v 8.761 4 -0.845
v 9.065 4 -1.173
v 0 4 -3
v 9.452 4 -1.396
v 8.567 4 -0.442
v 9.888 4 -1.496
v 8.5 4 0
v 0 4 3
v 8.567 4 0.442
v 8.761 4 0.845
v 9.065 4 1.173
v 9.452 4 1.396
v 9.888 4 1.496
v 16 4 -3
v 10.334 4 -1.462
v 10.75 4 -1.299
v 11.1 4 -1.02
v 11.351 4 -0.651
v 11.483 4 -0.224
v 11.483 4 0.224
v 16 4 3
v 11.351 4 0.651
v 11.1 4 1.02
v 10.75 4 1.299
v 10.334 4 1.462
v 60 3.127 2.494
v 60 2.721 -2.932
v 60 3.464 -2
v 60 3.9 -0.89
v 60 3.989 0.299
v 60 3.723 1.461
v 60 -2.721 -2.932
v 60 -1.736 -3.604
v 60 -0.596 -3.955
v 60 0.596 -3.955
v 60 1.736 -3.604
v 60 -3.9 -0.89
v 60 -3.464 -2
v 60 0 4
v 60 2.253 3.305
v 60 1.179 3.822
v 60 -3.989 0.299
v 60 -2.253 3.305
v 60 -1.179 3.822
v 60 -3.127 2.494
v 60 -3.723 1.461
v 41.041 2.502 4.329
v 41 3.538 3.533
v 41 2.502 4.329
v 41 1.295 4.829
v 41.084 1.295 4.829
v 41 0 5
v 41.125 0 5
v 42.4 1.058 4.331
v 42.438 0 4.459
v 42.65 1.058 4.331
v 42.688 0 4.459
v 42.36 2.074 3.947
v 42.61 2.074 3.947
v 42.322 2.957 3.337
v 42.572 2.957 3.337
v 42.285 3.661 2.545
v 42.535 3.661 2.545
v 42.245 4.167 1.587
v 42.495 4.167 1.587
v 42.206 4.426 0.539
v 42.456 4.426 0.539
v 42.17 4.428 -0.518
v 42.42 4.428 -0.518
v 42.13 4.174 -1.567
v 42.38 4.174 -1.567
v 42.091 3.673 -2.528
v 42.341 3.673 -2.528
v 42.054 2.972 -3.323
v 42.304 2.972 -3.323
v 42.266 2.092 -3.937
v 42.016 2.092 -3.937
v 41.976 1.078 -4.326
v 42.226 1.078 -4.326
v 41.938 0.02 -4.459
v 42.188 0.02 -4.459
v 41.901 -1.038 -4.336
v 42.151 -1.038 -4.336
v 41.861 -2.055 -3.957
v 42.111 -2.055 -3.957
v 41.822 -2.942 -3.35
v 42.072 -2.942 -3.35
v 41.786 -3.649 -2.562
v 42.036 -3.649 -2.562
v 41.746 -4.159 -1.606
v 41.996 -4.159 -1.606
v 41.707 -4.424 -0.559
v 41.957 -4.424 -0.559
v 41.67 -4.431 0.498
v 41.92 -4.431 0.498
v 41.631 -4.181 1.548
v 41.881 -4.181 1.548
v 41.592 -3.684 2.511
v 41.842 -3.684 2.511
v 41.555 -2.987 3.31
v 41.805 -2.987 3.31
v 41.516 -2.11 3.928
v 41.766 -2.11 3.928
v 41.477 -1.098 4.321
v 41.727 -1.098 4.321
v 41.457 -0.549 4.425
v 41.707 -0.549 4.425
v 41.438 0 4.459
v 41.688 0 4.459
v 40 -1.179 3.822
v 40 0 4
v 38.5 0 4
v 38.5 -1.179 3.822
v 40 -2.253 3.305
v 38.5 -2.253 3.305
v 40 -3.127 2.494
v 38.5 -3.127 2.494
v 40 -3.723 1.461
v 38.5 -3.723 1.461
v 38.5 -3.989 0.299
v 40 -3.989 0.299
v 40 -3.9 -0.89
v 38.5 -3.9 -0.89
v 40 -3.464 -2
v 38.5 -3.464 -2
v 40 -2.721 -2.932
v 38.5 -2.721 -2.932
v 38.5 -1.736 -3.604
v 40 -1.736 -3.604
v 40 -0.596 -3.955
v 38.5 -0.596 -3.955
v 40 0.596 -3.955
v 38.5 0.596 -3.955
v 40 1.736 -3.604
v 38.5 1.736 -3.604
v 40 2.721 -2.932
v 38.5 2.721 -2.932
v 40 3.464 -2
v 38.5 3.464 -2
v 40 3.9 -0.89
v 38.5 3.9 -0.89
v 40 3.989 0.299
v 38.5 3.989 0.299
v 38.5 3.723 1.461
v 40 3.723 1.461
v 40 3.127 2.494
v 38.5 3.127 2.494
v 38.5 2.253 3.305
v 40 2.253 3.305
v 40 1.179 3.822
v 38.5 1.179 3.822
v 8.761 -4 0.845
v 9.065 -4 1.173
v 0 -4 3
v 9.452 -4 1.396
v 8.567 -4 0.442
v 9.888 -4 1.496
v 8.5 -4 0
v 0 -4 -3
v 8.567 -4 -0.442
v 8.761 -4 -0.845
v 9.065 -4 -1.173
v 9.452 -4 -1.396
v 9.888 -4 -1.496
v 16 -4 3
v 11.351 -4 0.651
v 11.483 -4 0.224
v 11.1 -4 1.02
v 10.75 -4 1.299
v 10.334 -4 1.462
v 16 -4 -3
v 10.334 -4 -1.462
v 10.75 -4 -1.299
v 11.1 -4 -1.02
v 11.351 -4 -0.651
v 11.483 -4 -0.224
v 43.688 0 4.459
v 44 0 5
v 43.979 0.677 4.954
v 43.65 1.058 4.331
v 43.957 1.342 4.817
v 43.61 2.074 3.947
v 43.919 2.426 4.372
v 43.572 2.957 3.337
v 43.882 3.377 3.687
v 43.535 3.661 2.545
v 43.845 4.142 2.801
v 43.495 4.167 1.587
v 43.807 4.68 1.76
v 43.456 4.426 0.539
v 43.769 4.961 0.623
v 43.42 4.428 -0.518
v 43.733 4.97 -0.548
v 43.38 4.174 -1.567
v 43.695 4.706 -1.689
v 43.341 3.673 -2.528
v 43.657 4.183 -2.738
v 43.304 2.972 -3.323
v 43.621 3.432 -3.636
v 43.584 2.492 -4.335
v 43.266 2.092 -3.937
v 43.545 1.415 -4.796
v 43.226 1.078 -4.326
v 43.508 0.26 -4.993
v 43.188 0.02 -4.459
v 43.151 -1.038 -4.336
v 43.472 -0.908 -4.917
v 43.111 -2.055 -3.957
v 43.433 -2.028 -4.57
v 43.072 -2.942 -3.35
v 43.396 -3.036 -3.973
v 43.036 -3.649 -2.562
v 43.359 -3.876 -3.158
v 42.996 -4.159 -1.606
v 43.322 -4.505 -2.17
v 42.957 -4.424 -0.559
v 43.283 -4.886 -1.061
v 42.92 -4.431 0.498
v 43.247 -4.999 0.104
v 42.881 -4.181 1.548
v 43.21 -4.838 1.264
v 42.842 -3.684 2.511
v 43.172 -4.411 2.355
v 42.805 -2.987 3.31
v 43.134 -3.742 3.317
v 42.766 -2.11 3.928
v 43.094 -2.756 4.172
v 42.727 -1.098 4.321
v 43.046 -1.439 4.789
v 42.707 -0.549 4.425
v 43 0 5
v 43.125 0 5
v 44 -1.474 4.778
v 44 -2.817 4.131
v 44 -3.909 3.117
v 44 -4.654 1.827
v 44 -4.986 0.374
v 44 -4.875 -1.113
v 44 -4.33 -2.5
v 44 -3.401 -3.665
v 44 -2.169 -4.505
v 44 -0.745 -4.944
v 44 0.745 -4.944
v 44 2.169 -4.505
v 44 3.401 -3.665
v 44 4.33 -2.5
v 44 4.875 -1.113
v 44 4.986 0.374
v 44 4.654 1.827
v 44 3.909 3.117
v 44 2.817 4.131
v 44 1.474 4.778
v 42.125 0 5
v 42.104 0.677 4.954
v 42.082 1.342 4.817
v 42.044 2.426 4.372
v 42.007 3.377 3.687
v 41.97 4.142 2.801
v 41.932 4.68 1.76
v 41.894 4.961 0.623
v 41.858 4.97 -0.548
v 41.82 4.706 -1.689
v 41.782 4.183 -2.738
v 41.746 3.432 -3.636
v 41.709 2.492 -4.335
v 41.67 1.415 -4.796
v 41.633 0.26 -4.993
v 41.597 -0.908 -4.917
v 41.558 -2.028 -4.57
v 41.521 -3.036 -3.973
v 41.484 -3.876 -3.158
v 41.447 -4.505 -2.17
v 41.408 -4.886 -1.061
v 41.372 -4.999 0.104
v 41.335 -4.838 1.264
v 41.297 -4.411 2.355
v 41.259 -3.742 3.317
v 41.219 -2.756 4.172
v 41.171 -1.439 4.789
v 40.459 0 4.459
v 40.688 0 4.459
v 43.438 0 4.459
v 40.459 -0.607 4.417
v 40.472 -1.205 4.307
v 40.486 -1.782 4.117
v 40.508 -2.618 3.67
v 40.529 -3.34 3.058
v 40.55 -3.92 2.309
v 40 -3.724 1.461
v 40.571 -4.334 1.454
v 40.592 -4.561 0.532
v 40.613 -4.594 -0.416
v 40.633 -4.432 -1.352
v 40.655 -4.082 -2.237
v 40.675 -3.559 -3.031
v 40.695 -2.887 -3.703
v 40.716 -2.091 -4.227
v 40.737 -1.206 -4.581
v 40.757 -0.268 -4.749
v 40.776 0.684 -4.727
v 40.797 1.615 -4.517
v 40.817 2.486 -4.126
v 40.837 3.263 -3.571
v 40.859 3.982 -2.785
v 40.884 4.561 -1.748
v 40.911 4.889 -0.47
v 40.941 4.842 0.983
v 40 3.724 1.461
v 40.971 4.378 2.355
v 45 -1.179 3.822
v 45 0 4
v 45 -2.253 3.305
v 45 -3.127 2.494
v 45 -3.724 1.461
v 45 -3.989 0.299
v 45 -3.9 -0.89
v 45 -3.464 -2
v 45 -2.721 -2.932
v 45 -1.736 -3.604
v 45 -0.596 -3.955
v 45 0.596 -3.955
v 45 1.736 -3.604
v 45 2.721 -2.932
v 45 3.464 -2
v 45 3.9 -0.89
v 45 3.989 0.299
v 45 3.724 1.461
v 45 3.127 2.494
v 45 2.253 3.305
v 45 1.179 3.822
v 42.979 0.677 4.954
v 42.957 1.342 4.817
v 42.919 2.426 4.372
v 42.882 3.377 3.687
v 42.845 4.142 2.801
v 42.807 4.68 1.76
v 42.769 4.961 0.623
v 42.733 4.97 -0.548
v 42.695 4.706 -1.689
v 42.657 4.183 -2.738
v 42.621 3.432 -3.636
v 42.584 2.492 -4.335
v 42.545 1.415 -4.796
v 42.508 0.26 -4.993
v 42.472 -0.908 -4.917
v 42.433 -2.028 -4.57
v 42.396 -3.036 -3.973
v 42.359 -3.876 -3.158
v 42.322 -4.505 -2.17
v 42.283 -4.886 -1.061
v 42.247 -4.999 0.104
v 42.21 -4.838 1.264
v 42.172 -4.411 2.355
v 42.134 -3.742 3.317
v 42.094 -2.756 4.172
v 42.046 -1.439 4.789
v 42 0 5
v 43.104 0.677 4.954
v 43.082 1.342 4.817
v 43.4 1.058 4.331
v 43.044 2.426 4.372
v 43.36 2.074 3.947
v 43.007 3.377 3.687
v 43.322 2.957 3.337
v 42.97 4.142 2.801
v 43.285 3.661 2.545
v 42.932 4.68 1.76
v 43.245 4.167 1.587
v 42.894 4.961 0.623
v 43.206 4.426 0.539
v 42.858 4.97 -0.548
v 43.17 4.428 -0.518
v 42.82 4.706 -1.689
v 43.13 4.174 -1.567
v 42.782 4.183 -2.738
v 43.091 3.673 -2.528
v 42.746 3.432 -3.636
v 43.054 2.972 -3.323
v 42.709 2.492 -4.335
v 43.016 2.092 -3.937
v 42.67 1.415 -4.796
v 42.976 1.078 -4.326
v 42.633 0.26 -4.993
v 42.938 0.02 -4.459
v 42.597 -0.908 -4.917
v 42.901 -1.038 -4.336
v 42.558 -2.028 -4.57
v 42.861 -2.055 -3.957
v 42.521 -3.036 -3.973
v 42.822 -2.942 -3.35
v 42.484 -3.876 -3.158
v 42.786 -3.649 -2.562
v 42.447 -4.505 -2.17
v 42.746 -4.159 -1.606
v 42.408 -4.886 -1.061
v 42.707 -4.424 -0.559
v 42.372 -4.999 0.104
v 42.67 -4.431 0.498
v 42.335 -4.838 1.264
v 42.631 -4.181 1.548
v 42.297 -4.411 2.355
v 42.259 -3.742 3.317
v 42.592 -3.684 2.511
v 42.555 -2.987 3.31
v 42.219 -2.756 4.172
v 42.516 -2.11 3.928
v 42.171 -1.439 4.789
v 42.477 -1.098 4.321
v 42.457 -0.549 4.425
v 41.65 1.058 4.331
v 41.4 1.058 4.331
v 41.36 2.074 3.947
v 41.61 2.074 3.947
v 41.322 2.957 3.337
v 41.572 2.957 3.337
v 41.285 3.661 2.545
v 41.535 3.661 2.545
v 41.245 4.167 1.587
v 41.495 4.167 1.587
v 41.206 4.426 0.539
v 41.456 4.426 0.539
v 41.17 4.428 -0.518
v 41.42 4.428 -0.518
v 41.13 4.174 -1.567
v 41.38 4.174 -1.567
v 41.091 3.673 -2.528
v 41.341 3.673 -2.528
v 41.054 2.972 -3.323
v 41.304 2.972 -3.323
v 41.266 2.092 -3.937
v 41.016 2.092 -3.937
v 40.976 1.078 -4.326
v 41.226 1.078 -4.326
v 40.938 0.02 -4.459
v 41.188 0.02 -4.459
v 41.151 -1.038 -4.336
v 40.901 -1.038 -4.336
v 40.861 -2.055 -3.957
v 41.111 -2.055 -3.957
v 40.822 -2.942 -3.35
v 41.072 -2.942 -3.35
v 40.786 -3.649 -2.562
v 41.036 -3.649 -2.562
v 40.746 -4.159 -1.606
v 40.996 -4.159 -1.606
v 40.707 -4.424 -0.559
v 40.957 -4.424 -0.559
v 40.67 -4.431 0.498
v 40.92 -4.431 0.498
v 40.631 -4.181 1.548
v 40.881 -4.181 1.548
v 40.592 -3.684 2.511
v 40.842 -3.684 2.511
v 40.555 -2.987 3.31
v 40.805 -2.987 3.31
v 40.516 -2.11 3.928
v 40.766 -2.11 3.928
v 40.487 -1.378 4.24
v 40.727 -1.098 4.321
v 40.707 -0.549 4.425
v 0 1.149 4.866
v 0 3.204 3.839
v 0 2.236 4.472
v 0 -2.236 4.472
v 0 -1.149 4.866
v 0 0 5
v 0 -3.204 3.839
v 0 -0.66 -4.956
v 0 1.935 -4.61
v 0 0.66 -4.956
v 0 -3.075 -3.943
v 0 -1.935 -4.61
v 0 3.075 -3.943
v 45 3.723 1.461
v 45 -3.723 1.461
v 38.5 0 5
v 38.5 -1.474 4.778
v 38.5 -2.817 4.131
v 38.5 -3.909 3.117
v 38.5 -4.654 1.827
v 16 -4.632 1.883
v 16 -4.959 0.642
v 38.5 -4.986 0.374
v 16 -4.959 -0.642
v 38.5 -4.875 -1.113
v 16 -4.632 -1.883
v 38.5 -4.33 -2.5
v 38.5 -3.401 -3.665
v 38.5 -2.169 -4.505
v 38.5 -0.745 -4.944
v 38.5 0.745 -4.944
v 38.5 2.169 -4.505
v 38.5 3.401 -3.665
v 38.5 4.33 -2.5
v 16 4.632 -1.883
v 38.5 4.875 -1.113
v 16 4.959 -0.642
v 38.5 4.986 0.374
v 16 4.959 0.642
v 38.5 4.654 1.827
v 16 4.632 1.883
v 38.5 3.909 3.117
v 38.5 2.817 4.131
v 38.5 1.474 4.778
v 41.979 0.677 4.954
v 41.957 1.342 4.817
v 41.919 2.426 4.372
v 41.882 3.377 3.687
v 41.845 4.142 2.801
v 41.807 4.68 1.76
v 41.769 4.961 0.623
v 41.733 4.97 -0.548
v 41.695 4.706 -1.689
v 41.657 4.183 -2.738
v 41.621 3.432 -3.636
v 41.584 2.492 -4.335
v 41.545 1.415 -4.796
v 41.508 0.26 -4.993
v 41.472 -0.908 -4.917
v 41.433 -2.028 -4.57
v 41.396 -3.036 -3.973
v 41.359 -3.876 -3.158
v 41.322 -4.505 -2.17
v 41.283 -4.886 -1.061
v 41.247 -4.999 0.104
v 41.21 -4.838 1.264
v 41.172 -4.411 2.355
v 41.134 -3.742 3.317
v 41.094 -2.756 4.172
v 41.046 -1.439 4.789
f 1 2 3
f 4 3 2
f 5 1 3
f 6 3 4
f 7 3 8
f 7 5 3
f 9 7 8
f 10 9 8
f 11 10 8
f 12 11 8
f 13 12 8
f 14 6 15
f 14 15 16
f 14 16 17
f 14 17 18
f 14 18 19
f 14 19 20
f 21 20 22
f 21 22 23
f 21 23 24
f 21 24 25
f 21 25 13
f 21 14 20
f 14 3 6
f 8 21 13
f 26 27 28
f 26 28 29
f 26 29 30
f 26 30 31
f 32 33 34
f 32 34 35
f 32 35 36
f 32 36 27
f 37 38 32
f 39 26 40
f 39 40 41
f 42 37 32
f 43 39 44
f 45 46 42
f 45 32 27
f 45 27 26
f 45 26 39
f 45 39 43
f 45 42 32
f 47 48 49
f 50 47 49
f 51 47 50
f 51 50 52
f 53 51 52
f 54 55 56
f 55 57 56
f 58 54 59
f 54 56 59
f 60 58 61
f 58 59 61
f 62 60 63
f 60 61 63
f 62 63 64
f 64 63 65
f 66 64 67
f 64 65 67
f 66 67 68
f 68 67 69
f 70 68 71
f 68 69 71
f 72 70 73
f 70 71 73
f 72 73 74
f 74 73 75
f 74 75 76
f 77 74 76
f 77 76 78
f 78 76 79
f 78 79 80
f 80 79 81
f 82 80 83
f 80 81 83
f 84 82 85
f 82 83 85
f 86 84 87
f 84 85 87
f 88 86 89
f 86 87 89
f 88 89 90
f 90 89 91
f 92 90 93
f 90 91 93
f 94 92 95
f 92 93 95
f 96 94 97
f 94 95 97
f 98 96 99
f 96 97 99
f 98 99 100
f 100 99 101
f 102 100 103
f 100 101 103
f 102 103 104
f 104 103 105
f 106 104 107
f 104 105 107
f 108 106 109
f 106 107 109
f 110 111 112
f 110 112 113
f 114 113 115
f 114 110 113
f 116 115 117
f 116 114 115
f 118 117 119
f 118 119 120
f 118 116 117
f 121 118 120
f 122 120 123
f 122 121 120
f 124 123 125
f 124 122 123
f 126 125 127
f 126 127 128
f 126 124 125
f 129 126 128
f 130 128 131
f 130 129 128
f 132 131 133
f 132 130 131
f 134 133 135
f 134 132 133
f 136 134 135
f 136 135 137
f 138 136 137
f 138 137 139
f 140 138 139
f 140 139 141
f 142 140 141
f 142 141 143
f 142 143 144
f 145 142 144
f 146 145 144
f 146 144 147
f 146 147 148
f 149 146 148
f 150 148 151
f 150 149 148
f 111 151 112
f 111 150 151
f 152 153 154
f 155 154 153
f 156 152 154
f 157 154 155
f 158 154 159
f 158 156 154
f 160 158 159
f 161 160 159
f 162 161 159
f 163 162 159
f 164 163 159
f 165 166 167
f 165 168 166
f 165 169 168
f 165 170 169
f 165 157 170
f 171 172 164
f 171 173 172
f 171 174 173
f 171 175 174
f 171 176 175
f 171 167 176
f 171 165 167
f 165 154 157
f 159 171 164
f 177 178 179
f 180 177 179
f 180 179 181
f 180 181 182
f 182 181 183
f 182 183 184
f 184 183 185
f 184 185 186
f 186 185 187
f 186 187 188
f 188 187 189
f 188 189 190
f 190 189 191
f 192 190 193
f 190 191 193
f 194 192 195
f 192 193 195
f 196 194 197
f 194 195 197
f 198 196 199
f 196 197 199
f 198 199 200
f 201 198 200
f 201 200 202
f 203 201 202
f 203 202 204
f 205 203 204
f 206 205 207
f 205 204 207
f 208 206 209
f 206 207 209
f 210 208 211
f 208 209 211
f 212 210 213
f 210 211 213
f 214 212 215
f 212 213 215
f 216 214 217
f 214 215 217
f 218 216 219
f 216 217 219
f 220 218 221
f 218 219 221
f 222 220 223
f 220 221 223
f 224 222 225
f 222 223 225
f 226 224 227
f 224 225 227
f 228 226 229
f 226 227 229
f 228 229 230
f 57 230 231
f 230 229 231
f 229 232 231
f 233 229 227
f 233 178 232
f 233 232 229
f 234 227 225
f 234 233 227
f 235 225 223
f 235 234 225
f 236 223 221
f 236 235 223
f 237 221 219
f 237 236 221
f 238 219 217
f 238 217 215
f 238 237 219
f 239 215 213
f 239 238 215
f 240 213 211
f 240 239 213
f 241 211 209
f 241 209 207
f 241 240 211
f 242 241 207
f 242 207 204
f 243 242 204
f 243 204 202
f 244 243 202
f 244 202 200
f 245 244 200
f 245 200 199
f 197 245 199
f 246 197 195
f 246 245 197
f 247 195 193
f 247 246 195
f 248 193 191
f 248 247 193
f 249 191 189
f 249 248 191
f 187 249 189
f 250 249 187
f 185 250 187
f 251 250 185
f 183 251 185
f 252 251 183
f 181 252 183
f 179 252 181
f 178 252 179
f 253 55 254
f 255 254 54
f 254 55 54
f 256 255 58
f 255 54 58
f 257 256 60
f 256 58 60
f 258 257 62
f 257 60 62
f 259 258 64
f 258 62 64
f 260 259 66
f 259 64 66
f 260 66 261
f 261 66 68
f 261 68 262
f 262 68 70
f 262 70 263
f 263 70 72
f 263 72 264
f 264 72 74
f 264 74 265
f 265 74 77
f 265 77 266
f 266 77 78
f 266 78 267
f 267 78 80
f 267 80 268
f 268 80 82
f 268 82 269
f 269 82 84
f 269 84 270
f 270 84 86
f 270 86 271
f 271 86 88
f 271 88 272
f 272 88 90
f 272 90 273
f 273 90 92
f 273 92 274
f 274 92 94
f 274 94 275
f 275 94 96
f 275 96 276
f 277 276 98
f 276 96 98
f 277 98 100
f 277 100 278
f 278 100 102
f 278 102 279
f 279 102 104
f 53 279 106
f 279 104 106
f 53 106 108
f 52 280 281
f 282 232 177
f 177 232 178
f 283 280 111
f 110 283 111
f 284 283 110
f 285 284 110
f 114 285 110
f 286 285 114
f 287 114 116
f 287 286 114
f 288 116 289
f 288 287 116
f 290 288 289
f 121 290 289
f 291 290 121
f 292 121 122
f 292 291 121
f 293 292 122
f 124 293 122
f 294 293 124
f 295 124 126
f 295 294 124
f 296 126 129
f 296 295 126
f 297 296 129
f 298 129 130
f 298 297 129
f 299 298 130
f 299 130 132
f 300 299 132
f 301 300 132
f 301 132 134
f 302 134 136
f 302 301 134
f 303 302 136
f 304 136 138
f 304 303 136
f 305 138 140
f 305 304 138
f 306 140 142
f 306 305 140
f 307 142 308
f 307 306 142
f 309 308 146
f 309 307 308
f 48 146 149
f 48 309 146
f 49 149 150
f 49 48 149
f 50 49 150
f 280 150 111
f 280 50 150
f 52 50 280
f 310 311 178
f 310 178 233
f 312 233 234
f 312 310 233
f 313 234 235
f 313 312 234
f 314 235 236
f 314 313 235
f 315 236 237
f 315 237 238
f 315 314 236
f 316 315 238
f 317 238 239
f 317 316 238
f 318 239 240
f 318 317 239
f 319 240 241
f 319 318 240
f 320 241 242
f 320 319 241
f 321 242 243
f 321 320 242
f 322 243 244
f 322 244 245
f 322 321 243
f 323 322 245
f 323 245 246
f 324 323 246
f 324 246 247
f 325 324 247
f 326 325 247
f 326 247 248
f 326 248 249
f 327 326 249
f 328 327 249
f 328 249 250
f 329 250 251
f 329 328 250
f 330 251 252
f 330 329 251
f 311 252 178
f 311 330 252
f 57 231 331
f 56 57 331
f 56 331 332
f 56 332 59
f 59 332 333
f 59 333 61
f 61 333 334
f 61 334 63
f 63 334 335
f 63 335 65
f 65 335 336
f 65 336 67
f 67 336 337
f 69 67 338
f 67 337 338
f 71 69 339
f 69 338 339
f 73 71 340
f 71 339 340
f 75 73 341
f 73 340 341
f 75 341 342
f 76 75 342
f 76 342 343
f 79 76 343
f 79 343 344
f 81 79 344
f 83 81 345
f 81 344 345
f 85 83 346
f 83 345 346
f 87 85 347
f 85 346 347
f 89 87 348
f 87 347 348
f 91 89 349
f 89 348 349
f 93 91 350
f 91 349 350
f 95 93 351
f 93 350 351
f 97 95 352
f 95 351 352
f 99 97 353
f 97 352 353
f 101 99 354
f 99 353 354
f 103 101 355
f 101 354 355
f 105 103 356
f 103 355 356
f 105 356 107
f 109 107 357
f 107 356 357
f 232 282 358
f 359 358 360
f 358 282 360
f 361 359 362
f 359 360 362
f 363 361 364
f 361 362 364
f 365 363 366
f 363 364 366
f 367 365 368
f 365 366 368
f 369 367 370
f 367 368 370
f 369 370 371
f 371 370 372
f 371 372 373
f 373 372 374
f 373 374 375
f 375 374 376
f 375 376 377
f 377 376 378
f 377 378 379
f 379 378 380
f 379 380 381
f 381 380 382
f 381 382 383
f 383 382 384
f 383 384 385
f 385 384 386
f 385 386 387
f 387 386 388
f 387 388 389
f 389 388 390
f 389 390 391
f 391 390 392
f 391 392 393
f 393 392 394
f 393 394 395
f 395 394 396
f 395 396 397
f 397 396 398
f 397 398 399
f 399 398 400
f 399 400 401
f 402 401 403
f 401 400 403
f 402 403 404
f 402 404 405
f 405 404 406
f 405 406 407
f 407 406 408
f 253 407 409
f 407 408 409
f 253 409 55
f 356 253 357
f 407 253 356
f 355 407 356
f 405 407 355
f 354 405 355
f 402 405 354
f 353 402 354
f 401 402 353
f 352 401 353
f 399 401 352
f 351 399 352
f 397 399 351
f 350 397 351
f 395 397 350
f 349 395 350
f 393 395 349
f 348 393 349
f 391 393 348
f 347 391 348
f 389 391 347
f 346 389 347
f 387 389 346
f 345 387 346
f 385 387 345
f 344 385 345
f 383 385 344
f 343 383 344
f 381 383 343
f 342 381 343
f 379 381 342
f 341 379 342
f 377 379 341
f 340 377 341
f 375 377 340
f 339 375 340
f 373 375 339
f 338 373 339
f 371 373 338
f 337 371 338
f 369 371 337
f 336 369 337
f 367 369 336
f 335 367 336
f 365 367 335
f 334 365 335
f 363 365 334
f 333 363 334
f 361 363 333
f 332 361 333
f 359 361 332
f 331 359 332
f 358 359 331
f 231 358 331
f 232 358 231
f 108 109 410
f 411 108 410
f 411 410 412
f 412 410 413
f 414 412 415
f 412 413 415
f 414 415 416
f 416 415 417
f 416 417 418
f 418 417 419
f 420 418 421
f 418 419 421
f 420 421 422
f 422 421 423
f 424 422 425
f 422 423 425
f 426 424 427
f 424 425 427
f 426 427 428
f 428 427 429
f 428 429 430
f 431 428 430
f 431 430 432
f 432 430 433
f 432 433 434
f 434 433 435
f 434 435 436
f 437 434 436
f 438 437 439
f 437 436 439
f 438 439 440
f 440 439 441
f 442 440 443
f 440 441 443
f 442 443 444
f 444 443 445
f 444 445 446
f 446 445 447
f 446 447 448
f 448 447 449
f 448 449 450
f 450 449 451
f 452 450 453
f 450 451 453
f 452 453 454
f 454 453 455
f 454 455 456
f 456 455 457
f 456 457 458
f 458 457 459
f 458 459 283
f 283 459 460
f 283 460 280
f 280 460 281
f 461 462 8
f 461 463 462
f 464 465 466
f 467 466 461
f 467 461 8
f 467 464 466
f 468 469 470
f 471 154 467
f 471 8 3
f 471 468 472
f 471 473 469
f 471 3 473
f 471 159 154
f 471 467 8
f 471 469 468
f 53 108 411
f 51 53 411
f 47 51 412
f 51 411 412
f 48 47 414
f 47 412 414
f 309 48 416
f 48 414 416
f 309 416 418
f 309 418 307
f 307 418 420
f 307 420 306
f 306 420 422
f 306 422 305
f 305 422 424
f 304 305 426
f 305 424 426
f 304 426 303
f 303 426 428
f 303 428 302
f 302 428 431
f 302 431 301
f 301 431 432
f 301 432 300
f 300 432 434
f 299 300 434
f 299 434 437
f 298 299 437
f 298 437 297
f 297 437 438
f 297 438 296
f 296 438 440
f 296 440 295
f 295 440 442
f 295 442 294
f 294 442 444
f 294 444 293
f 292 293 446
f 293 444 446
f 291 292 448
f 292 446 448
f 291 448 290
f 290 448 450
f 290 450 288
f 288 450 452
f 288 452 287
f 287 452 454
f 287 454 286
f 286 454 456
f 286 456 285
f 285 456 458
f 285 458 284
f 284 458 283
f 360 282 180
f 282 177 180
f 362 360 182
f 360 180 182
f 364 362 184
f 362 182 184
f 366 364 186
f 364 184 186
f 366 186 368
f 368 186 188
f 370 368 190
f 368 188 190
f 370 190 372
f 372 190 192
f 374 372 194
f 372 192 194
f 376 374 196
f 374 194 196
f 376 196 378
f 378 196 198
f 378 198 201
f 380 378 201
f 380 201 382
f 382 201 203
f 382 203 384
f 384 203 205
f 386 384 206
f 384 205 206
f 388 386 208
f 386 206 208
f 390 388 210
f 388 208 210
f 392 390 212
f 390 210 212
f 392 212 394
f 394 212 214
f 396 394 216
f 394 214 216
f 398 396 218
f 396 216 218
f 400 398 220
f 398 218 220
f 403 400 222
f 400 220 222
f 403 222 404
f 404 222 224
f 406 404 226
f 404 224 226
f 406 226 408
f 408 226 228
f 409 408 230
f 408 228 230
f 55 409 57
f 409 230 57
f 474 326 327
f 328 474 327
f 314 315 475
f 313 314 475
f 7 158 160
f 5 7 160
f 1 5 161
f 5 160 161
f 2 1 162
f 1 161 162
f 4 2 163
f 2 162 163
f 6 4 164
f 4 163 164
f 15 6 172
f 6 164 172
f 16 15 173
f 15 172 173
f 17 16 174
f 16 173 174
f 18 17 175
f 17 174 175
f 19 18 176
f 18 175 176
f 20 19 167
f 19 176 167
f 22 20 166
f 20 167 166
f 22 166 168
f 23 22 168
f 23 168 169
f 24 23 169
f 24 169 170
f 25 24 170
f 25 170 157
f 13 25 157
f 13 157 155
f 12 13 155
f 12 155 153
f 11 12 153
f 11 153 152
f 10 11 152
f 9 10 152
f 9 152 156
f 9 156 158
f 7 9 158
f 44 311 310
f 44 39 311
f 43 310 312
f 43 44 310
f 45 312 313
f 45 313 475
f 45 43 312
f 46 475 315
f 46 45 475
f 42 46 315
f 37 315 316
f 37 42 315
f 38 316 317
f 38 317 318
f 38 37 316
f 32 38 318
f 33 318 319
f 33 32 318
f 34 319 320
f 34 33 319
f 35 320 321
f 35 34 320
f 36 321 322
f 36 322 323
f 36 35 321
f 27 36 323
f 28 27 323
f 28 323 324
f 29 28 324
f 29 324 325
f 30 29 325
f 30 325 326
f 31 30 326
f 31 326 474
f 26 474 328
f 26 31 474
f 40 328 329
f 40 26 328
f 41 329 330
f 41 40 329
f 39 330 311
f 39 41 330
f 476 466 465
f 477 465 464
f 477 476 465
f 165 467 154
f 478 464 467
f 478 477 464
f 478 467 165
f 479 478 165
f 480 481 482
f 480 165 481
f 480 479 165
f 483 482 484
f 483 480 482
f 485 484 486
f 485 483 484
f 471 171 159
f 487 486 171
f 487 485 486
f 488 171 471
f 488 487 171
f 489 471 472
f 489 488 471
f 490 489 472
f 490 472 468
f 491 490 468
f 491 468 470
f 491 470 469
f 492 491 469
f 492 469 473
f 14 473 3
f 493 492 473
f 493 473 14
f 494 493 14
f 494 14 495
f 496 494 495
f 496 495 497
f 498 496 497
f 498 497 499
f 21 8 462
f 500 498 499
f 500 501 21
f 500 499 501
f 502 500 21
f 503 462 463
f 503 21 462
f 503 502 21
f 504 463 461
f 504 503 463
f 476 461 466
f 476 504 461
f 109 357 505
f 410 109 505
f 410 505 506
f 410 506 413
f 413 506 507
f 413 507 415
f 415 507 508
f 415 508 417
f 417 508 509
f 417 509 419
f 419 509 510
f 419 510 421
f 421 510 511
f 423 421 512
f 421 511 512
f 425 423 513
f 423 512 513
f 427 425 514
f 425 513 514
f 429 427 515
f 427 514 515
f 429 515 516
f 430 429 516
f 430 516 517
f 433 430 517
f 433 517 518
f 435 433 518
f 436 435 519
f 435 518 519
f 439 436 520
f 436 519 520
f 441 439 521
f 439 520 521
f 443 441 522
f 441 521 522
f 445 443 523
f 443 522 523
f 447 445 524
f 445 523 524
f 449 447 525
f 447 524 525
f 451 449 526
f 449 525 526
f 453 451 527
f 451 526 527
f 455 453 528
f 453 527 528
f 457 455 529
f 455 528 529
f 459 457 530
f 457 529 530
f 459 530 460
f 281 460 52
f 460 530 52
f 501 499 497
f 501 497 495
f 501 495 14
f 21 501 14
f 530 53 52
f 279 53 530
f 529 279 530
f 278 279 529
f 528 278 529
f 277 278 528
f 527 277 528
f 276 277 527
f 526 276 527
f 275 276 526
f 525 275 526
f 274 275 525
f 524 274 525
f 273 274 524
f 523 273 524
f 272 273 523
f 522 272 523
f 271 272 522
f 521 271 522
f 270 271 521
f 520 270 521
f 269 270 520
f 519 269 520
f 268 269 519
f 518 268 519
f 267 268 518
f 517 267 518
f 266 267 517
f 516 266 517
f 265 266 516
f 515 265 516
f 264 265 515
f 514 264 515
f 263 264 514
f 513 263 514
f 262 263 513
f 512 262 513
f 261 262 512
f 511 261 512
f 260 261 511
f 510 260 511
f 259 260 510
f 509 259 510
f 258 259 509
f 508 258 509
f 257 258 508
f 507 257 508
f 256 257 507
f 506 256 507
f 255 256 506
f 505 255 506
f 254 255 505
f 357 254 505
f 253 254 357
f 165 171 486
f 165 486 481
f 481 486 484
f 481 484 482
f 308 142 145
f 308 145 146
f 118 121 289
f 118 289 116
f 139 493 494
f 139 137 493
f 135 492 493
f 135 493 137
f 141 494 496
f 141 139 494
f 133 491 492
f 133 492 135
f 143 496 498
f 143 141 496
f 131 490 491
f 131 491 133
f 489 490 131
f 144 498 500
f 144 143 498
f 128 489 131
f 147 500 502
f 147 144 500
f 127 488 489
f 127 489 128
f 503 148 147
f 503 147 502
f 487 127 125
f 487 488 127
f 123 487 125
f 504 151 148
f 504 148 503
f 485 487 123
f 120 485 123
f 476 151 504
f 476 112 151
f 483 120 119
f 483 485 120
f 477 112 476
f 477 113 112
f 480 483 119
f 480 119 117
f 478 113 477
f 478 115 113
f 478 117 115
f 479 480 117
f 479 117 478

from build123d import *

# Parameters (mm, degrees)
CUT_EXTRUDE1_START    = -16
CUT_EXTRUDE1_DEPTH    = 16
F_3_0MM_DOWEL_HOLE1_D = 3
CUT_EXTRUDE3_START    = -20
SKETCH17_R            = 5
SKETCH17_R_2          = 4
CUT_EXTRUDE3_DEPTH    = 1.5
CHAMFER2_SIZE         = 1
THREAD2_PITCH         = 1


with BuildPart() as part:
    # Sketch1 → Revolve1 (revolve)
    with BuildSketch(Plane.XY, mode=Mode.PRIVATE) as revolve1_sk:
        Polygon((0, 0), (0, 5), (45, 5), (45, 4), (60, 4), (60, 0), align=None)
    revolve(revolve1_sk.sketch.rotate(Axis((0, 0, 0), (1, 0, 0)), 90), axis=Axis((0, 0, 0), (1, 0, 0)))

    # Sketch2 → Cut-Extrude1 (cut)
    with BuildSketch(Plane.ZY.offset(CUT_EXTRUDE1_START)):
        with BuildLine():
            Line((-3, 4), (3, 4))
            ThreePointArc((3, 4), (0, 5), (-3, 4))
        make_face()
        with BuildLine():
            Line((3, -4), (-3, -4))
            ThreePointArc((-3, -4), (0, -5), (3, -4))
        make_face()
    extrude(amount=CUT_EXTRUDE1_DEPTH, mode=Mode.SUBTRACT)

    # Ø3.0mm Dowel Hole1 (through all)
    with Locations(Plane(origin=(0, 4, 0), x_dir=(1, 0, 0), z_dir=(0, 1, 0))):
        with Locations((10, 0)):
            Hole(F_3_0MM_DOWEL_HOLE1_D / 2)

    # Sketch17 → Cut-Extrude3 (cut)
    with BuildSketch(Plane(origin=(60, 0, 0), x_dir=(0, 0, -1), z_dir=(1, 0, 0)).offset(CUT_EXTRUDE3_START)):
        with Locations(Location((0, 0, 0), (0, 0, 180))):
            Circle(SKETCH17_R)
        with Locations(Location((0, 0, 0), (0, 0, 180))):
            Circle(SKETCH17_R_2, mode=Mode.SUBTRACT)
    extrude(amount=-CUT_EXTRUDE3_DEPTH, mode=Mode.SUBTRACT)

    # Chamfer2
    chamfer2_edges = [part.edges().sort_by_distance(p)[0] for p in [
        (40, 0, -5),
        (45, 0, -5),
    ]]
    chamfer(chamfer2_edges, length=CHAMFER2_SIZE - 0.0001)  # a hair under: the kernel refuses the full size

    # Thread2: the profile of Thread Profile2 profile screwed along a right-hand helix of 3 turns, 8 arcs to a turn; built about Z, then put on its axis
    thread2_z = Axis((0, 0, 0), (0, 0, 1))
    thread2_corners = [(5.0003, 0, -0.000173205), (5.0003, 0, 0.875173202), (4.458734125, 0, 0.562499999), (4.458734125, 0, 0.312499999)]
    with BuildLine(mode=Mode.PRIVATE) as thread2_profile:
        Line(thread2_corners[0], thread2_corners[1])
        Line(thread2_corners[1], thread2_corners[2])
        Line(thread2_corners[2], thread2_corners[3])
        Line(thread2_corners[3], thread2_corners[0])
    thread2_cap = Face(thread2_profile.wire())
    thread2_turn_angles = [0, 22.5, 45, 67.5, 90, 112.5, 135, 157.5, 180, 202.5, 225, 247.5, 270, 292.5, 315, 337.5, 360]
    thread2_turn_weights = [1, 0.9238795325112867, 1, 0.9238795325112867, 1, 0.9238795325112867, 1, 0.9238795325112867, 1, 0.9238795325112867, 1, 0.9238795325112867, 1, 0.9238795325112867, 1, 0.9238795325112867, 1]
    thread2_turn_rails = [Edge.make_bspline([Vector(p[0], p[1], 0).rotate(thread2_z, thread2_turn_angles[k]) / thread2_turn_weights[k] + Vector(0, 0, p[2] + THREAD2_PITCH * thread2_turn_angles[k] / 360) for k in range(17)], [0, 0, 0, 1, 1, 2, 2, 3, 3, 4, 4, 5, 5, 6, 6, 7, 7, 8, 8, 8], 2, thread2_turn_weights) for p in thread2_corners]
    thread2_turn_sides = [Face.make_surface_from_curves(thread2_turn_rails[p[0]], thread2_turn_rails[p[1]]) for p in [(0, 1), (1, 2), (2, 3), (3, 0)]]
    thread2 = Plane(origin=(44, 0, 0), x_dir=(0, 0, 1), z_dir=(-1, 0, 0)) * Solid(Shell([*[p.moved(Location((0, 0, THREAD2_PITCH * i))) for i in range(3) for p in thread2_turn_sides], thread2_cap, thread2_cap.rotate(thread2_z, 1080).moved(Location((0, 0, THREAD2_PITCH * 1080 / 360)))]))
    add(thread2, mode=Mode.SUBTRACT)


solid = part.part
